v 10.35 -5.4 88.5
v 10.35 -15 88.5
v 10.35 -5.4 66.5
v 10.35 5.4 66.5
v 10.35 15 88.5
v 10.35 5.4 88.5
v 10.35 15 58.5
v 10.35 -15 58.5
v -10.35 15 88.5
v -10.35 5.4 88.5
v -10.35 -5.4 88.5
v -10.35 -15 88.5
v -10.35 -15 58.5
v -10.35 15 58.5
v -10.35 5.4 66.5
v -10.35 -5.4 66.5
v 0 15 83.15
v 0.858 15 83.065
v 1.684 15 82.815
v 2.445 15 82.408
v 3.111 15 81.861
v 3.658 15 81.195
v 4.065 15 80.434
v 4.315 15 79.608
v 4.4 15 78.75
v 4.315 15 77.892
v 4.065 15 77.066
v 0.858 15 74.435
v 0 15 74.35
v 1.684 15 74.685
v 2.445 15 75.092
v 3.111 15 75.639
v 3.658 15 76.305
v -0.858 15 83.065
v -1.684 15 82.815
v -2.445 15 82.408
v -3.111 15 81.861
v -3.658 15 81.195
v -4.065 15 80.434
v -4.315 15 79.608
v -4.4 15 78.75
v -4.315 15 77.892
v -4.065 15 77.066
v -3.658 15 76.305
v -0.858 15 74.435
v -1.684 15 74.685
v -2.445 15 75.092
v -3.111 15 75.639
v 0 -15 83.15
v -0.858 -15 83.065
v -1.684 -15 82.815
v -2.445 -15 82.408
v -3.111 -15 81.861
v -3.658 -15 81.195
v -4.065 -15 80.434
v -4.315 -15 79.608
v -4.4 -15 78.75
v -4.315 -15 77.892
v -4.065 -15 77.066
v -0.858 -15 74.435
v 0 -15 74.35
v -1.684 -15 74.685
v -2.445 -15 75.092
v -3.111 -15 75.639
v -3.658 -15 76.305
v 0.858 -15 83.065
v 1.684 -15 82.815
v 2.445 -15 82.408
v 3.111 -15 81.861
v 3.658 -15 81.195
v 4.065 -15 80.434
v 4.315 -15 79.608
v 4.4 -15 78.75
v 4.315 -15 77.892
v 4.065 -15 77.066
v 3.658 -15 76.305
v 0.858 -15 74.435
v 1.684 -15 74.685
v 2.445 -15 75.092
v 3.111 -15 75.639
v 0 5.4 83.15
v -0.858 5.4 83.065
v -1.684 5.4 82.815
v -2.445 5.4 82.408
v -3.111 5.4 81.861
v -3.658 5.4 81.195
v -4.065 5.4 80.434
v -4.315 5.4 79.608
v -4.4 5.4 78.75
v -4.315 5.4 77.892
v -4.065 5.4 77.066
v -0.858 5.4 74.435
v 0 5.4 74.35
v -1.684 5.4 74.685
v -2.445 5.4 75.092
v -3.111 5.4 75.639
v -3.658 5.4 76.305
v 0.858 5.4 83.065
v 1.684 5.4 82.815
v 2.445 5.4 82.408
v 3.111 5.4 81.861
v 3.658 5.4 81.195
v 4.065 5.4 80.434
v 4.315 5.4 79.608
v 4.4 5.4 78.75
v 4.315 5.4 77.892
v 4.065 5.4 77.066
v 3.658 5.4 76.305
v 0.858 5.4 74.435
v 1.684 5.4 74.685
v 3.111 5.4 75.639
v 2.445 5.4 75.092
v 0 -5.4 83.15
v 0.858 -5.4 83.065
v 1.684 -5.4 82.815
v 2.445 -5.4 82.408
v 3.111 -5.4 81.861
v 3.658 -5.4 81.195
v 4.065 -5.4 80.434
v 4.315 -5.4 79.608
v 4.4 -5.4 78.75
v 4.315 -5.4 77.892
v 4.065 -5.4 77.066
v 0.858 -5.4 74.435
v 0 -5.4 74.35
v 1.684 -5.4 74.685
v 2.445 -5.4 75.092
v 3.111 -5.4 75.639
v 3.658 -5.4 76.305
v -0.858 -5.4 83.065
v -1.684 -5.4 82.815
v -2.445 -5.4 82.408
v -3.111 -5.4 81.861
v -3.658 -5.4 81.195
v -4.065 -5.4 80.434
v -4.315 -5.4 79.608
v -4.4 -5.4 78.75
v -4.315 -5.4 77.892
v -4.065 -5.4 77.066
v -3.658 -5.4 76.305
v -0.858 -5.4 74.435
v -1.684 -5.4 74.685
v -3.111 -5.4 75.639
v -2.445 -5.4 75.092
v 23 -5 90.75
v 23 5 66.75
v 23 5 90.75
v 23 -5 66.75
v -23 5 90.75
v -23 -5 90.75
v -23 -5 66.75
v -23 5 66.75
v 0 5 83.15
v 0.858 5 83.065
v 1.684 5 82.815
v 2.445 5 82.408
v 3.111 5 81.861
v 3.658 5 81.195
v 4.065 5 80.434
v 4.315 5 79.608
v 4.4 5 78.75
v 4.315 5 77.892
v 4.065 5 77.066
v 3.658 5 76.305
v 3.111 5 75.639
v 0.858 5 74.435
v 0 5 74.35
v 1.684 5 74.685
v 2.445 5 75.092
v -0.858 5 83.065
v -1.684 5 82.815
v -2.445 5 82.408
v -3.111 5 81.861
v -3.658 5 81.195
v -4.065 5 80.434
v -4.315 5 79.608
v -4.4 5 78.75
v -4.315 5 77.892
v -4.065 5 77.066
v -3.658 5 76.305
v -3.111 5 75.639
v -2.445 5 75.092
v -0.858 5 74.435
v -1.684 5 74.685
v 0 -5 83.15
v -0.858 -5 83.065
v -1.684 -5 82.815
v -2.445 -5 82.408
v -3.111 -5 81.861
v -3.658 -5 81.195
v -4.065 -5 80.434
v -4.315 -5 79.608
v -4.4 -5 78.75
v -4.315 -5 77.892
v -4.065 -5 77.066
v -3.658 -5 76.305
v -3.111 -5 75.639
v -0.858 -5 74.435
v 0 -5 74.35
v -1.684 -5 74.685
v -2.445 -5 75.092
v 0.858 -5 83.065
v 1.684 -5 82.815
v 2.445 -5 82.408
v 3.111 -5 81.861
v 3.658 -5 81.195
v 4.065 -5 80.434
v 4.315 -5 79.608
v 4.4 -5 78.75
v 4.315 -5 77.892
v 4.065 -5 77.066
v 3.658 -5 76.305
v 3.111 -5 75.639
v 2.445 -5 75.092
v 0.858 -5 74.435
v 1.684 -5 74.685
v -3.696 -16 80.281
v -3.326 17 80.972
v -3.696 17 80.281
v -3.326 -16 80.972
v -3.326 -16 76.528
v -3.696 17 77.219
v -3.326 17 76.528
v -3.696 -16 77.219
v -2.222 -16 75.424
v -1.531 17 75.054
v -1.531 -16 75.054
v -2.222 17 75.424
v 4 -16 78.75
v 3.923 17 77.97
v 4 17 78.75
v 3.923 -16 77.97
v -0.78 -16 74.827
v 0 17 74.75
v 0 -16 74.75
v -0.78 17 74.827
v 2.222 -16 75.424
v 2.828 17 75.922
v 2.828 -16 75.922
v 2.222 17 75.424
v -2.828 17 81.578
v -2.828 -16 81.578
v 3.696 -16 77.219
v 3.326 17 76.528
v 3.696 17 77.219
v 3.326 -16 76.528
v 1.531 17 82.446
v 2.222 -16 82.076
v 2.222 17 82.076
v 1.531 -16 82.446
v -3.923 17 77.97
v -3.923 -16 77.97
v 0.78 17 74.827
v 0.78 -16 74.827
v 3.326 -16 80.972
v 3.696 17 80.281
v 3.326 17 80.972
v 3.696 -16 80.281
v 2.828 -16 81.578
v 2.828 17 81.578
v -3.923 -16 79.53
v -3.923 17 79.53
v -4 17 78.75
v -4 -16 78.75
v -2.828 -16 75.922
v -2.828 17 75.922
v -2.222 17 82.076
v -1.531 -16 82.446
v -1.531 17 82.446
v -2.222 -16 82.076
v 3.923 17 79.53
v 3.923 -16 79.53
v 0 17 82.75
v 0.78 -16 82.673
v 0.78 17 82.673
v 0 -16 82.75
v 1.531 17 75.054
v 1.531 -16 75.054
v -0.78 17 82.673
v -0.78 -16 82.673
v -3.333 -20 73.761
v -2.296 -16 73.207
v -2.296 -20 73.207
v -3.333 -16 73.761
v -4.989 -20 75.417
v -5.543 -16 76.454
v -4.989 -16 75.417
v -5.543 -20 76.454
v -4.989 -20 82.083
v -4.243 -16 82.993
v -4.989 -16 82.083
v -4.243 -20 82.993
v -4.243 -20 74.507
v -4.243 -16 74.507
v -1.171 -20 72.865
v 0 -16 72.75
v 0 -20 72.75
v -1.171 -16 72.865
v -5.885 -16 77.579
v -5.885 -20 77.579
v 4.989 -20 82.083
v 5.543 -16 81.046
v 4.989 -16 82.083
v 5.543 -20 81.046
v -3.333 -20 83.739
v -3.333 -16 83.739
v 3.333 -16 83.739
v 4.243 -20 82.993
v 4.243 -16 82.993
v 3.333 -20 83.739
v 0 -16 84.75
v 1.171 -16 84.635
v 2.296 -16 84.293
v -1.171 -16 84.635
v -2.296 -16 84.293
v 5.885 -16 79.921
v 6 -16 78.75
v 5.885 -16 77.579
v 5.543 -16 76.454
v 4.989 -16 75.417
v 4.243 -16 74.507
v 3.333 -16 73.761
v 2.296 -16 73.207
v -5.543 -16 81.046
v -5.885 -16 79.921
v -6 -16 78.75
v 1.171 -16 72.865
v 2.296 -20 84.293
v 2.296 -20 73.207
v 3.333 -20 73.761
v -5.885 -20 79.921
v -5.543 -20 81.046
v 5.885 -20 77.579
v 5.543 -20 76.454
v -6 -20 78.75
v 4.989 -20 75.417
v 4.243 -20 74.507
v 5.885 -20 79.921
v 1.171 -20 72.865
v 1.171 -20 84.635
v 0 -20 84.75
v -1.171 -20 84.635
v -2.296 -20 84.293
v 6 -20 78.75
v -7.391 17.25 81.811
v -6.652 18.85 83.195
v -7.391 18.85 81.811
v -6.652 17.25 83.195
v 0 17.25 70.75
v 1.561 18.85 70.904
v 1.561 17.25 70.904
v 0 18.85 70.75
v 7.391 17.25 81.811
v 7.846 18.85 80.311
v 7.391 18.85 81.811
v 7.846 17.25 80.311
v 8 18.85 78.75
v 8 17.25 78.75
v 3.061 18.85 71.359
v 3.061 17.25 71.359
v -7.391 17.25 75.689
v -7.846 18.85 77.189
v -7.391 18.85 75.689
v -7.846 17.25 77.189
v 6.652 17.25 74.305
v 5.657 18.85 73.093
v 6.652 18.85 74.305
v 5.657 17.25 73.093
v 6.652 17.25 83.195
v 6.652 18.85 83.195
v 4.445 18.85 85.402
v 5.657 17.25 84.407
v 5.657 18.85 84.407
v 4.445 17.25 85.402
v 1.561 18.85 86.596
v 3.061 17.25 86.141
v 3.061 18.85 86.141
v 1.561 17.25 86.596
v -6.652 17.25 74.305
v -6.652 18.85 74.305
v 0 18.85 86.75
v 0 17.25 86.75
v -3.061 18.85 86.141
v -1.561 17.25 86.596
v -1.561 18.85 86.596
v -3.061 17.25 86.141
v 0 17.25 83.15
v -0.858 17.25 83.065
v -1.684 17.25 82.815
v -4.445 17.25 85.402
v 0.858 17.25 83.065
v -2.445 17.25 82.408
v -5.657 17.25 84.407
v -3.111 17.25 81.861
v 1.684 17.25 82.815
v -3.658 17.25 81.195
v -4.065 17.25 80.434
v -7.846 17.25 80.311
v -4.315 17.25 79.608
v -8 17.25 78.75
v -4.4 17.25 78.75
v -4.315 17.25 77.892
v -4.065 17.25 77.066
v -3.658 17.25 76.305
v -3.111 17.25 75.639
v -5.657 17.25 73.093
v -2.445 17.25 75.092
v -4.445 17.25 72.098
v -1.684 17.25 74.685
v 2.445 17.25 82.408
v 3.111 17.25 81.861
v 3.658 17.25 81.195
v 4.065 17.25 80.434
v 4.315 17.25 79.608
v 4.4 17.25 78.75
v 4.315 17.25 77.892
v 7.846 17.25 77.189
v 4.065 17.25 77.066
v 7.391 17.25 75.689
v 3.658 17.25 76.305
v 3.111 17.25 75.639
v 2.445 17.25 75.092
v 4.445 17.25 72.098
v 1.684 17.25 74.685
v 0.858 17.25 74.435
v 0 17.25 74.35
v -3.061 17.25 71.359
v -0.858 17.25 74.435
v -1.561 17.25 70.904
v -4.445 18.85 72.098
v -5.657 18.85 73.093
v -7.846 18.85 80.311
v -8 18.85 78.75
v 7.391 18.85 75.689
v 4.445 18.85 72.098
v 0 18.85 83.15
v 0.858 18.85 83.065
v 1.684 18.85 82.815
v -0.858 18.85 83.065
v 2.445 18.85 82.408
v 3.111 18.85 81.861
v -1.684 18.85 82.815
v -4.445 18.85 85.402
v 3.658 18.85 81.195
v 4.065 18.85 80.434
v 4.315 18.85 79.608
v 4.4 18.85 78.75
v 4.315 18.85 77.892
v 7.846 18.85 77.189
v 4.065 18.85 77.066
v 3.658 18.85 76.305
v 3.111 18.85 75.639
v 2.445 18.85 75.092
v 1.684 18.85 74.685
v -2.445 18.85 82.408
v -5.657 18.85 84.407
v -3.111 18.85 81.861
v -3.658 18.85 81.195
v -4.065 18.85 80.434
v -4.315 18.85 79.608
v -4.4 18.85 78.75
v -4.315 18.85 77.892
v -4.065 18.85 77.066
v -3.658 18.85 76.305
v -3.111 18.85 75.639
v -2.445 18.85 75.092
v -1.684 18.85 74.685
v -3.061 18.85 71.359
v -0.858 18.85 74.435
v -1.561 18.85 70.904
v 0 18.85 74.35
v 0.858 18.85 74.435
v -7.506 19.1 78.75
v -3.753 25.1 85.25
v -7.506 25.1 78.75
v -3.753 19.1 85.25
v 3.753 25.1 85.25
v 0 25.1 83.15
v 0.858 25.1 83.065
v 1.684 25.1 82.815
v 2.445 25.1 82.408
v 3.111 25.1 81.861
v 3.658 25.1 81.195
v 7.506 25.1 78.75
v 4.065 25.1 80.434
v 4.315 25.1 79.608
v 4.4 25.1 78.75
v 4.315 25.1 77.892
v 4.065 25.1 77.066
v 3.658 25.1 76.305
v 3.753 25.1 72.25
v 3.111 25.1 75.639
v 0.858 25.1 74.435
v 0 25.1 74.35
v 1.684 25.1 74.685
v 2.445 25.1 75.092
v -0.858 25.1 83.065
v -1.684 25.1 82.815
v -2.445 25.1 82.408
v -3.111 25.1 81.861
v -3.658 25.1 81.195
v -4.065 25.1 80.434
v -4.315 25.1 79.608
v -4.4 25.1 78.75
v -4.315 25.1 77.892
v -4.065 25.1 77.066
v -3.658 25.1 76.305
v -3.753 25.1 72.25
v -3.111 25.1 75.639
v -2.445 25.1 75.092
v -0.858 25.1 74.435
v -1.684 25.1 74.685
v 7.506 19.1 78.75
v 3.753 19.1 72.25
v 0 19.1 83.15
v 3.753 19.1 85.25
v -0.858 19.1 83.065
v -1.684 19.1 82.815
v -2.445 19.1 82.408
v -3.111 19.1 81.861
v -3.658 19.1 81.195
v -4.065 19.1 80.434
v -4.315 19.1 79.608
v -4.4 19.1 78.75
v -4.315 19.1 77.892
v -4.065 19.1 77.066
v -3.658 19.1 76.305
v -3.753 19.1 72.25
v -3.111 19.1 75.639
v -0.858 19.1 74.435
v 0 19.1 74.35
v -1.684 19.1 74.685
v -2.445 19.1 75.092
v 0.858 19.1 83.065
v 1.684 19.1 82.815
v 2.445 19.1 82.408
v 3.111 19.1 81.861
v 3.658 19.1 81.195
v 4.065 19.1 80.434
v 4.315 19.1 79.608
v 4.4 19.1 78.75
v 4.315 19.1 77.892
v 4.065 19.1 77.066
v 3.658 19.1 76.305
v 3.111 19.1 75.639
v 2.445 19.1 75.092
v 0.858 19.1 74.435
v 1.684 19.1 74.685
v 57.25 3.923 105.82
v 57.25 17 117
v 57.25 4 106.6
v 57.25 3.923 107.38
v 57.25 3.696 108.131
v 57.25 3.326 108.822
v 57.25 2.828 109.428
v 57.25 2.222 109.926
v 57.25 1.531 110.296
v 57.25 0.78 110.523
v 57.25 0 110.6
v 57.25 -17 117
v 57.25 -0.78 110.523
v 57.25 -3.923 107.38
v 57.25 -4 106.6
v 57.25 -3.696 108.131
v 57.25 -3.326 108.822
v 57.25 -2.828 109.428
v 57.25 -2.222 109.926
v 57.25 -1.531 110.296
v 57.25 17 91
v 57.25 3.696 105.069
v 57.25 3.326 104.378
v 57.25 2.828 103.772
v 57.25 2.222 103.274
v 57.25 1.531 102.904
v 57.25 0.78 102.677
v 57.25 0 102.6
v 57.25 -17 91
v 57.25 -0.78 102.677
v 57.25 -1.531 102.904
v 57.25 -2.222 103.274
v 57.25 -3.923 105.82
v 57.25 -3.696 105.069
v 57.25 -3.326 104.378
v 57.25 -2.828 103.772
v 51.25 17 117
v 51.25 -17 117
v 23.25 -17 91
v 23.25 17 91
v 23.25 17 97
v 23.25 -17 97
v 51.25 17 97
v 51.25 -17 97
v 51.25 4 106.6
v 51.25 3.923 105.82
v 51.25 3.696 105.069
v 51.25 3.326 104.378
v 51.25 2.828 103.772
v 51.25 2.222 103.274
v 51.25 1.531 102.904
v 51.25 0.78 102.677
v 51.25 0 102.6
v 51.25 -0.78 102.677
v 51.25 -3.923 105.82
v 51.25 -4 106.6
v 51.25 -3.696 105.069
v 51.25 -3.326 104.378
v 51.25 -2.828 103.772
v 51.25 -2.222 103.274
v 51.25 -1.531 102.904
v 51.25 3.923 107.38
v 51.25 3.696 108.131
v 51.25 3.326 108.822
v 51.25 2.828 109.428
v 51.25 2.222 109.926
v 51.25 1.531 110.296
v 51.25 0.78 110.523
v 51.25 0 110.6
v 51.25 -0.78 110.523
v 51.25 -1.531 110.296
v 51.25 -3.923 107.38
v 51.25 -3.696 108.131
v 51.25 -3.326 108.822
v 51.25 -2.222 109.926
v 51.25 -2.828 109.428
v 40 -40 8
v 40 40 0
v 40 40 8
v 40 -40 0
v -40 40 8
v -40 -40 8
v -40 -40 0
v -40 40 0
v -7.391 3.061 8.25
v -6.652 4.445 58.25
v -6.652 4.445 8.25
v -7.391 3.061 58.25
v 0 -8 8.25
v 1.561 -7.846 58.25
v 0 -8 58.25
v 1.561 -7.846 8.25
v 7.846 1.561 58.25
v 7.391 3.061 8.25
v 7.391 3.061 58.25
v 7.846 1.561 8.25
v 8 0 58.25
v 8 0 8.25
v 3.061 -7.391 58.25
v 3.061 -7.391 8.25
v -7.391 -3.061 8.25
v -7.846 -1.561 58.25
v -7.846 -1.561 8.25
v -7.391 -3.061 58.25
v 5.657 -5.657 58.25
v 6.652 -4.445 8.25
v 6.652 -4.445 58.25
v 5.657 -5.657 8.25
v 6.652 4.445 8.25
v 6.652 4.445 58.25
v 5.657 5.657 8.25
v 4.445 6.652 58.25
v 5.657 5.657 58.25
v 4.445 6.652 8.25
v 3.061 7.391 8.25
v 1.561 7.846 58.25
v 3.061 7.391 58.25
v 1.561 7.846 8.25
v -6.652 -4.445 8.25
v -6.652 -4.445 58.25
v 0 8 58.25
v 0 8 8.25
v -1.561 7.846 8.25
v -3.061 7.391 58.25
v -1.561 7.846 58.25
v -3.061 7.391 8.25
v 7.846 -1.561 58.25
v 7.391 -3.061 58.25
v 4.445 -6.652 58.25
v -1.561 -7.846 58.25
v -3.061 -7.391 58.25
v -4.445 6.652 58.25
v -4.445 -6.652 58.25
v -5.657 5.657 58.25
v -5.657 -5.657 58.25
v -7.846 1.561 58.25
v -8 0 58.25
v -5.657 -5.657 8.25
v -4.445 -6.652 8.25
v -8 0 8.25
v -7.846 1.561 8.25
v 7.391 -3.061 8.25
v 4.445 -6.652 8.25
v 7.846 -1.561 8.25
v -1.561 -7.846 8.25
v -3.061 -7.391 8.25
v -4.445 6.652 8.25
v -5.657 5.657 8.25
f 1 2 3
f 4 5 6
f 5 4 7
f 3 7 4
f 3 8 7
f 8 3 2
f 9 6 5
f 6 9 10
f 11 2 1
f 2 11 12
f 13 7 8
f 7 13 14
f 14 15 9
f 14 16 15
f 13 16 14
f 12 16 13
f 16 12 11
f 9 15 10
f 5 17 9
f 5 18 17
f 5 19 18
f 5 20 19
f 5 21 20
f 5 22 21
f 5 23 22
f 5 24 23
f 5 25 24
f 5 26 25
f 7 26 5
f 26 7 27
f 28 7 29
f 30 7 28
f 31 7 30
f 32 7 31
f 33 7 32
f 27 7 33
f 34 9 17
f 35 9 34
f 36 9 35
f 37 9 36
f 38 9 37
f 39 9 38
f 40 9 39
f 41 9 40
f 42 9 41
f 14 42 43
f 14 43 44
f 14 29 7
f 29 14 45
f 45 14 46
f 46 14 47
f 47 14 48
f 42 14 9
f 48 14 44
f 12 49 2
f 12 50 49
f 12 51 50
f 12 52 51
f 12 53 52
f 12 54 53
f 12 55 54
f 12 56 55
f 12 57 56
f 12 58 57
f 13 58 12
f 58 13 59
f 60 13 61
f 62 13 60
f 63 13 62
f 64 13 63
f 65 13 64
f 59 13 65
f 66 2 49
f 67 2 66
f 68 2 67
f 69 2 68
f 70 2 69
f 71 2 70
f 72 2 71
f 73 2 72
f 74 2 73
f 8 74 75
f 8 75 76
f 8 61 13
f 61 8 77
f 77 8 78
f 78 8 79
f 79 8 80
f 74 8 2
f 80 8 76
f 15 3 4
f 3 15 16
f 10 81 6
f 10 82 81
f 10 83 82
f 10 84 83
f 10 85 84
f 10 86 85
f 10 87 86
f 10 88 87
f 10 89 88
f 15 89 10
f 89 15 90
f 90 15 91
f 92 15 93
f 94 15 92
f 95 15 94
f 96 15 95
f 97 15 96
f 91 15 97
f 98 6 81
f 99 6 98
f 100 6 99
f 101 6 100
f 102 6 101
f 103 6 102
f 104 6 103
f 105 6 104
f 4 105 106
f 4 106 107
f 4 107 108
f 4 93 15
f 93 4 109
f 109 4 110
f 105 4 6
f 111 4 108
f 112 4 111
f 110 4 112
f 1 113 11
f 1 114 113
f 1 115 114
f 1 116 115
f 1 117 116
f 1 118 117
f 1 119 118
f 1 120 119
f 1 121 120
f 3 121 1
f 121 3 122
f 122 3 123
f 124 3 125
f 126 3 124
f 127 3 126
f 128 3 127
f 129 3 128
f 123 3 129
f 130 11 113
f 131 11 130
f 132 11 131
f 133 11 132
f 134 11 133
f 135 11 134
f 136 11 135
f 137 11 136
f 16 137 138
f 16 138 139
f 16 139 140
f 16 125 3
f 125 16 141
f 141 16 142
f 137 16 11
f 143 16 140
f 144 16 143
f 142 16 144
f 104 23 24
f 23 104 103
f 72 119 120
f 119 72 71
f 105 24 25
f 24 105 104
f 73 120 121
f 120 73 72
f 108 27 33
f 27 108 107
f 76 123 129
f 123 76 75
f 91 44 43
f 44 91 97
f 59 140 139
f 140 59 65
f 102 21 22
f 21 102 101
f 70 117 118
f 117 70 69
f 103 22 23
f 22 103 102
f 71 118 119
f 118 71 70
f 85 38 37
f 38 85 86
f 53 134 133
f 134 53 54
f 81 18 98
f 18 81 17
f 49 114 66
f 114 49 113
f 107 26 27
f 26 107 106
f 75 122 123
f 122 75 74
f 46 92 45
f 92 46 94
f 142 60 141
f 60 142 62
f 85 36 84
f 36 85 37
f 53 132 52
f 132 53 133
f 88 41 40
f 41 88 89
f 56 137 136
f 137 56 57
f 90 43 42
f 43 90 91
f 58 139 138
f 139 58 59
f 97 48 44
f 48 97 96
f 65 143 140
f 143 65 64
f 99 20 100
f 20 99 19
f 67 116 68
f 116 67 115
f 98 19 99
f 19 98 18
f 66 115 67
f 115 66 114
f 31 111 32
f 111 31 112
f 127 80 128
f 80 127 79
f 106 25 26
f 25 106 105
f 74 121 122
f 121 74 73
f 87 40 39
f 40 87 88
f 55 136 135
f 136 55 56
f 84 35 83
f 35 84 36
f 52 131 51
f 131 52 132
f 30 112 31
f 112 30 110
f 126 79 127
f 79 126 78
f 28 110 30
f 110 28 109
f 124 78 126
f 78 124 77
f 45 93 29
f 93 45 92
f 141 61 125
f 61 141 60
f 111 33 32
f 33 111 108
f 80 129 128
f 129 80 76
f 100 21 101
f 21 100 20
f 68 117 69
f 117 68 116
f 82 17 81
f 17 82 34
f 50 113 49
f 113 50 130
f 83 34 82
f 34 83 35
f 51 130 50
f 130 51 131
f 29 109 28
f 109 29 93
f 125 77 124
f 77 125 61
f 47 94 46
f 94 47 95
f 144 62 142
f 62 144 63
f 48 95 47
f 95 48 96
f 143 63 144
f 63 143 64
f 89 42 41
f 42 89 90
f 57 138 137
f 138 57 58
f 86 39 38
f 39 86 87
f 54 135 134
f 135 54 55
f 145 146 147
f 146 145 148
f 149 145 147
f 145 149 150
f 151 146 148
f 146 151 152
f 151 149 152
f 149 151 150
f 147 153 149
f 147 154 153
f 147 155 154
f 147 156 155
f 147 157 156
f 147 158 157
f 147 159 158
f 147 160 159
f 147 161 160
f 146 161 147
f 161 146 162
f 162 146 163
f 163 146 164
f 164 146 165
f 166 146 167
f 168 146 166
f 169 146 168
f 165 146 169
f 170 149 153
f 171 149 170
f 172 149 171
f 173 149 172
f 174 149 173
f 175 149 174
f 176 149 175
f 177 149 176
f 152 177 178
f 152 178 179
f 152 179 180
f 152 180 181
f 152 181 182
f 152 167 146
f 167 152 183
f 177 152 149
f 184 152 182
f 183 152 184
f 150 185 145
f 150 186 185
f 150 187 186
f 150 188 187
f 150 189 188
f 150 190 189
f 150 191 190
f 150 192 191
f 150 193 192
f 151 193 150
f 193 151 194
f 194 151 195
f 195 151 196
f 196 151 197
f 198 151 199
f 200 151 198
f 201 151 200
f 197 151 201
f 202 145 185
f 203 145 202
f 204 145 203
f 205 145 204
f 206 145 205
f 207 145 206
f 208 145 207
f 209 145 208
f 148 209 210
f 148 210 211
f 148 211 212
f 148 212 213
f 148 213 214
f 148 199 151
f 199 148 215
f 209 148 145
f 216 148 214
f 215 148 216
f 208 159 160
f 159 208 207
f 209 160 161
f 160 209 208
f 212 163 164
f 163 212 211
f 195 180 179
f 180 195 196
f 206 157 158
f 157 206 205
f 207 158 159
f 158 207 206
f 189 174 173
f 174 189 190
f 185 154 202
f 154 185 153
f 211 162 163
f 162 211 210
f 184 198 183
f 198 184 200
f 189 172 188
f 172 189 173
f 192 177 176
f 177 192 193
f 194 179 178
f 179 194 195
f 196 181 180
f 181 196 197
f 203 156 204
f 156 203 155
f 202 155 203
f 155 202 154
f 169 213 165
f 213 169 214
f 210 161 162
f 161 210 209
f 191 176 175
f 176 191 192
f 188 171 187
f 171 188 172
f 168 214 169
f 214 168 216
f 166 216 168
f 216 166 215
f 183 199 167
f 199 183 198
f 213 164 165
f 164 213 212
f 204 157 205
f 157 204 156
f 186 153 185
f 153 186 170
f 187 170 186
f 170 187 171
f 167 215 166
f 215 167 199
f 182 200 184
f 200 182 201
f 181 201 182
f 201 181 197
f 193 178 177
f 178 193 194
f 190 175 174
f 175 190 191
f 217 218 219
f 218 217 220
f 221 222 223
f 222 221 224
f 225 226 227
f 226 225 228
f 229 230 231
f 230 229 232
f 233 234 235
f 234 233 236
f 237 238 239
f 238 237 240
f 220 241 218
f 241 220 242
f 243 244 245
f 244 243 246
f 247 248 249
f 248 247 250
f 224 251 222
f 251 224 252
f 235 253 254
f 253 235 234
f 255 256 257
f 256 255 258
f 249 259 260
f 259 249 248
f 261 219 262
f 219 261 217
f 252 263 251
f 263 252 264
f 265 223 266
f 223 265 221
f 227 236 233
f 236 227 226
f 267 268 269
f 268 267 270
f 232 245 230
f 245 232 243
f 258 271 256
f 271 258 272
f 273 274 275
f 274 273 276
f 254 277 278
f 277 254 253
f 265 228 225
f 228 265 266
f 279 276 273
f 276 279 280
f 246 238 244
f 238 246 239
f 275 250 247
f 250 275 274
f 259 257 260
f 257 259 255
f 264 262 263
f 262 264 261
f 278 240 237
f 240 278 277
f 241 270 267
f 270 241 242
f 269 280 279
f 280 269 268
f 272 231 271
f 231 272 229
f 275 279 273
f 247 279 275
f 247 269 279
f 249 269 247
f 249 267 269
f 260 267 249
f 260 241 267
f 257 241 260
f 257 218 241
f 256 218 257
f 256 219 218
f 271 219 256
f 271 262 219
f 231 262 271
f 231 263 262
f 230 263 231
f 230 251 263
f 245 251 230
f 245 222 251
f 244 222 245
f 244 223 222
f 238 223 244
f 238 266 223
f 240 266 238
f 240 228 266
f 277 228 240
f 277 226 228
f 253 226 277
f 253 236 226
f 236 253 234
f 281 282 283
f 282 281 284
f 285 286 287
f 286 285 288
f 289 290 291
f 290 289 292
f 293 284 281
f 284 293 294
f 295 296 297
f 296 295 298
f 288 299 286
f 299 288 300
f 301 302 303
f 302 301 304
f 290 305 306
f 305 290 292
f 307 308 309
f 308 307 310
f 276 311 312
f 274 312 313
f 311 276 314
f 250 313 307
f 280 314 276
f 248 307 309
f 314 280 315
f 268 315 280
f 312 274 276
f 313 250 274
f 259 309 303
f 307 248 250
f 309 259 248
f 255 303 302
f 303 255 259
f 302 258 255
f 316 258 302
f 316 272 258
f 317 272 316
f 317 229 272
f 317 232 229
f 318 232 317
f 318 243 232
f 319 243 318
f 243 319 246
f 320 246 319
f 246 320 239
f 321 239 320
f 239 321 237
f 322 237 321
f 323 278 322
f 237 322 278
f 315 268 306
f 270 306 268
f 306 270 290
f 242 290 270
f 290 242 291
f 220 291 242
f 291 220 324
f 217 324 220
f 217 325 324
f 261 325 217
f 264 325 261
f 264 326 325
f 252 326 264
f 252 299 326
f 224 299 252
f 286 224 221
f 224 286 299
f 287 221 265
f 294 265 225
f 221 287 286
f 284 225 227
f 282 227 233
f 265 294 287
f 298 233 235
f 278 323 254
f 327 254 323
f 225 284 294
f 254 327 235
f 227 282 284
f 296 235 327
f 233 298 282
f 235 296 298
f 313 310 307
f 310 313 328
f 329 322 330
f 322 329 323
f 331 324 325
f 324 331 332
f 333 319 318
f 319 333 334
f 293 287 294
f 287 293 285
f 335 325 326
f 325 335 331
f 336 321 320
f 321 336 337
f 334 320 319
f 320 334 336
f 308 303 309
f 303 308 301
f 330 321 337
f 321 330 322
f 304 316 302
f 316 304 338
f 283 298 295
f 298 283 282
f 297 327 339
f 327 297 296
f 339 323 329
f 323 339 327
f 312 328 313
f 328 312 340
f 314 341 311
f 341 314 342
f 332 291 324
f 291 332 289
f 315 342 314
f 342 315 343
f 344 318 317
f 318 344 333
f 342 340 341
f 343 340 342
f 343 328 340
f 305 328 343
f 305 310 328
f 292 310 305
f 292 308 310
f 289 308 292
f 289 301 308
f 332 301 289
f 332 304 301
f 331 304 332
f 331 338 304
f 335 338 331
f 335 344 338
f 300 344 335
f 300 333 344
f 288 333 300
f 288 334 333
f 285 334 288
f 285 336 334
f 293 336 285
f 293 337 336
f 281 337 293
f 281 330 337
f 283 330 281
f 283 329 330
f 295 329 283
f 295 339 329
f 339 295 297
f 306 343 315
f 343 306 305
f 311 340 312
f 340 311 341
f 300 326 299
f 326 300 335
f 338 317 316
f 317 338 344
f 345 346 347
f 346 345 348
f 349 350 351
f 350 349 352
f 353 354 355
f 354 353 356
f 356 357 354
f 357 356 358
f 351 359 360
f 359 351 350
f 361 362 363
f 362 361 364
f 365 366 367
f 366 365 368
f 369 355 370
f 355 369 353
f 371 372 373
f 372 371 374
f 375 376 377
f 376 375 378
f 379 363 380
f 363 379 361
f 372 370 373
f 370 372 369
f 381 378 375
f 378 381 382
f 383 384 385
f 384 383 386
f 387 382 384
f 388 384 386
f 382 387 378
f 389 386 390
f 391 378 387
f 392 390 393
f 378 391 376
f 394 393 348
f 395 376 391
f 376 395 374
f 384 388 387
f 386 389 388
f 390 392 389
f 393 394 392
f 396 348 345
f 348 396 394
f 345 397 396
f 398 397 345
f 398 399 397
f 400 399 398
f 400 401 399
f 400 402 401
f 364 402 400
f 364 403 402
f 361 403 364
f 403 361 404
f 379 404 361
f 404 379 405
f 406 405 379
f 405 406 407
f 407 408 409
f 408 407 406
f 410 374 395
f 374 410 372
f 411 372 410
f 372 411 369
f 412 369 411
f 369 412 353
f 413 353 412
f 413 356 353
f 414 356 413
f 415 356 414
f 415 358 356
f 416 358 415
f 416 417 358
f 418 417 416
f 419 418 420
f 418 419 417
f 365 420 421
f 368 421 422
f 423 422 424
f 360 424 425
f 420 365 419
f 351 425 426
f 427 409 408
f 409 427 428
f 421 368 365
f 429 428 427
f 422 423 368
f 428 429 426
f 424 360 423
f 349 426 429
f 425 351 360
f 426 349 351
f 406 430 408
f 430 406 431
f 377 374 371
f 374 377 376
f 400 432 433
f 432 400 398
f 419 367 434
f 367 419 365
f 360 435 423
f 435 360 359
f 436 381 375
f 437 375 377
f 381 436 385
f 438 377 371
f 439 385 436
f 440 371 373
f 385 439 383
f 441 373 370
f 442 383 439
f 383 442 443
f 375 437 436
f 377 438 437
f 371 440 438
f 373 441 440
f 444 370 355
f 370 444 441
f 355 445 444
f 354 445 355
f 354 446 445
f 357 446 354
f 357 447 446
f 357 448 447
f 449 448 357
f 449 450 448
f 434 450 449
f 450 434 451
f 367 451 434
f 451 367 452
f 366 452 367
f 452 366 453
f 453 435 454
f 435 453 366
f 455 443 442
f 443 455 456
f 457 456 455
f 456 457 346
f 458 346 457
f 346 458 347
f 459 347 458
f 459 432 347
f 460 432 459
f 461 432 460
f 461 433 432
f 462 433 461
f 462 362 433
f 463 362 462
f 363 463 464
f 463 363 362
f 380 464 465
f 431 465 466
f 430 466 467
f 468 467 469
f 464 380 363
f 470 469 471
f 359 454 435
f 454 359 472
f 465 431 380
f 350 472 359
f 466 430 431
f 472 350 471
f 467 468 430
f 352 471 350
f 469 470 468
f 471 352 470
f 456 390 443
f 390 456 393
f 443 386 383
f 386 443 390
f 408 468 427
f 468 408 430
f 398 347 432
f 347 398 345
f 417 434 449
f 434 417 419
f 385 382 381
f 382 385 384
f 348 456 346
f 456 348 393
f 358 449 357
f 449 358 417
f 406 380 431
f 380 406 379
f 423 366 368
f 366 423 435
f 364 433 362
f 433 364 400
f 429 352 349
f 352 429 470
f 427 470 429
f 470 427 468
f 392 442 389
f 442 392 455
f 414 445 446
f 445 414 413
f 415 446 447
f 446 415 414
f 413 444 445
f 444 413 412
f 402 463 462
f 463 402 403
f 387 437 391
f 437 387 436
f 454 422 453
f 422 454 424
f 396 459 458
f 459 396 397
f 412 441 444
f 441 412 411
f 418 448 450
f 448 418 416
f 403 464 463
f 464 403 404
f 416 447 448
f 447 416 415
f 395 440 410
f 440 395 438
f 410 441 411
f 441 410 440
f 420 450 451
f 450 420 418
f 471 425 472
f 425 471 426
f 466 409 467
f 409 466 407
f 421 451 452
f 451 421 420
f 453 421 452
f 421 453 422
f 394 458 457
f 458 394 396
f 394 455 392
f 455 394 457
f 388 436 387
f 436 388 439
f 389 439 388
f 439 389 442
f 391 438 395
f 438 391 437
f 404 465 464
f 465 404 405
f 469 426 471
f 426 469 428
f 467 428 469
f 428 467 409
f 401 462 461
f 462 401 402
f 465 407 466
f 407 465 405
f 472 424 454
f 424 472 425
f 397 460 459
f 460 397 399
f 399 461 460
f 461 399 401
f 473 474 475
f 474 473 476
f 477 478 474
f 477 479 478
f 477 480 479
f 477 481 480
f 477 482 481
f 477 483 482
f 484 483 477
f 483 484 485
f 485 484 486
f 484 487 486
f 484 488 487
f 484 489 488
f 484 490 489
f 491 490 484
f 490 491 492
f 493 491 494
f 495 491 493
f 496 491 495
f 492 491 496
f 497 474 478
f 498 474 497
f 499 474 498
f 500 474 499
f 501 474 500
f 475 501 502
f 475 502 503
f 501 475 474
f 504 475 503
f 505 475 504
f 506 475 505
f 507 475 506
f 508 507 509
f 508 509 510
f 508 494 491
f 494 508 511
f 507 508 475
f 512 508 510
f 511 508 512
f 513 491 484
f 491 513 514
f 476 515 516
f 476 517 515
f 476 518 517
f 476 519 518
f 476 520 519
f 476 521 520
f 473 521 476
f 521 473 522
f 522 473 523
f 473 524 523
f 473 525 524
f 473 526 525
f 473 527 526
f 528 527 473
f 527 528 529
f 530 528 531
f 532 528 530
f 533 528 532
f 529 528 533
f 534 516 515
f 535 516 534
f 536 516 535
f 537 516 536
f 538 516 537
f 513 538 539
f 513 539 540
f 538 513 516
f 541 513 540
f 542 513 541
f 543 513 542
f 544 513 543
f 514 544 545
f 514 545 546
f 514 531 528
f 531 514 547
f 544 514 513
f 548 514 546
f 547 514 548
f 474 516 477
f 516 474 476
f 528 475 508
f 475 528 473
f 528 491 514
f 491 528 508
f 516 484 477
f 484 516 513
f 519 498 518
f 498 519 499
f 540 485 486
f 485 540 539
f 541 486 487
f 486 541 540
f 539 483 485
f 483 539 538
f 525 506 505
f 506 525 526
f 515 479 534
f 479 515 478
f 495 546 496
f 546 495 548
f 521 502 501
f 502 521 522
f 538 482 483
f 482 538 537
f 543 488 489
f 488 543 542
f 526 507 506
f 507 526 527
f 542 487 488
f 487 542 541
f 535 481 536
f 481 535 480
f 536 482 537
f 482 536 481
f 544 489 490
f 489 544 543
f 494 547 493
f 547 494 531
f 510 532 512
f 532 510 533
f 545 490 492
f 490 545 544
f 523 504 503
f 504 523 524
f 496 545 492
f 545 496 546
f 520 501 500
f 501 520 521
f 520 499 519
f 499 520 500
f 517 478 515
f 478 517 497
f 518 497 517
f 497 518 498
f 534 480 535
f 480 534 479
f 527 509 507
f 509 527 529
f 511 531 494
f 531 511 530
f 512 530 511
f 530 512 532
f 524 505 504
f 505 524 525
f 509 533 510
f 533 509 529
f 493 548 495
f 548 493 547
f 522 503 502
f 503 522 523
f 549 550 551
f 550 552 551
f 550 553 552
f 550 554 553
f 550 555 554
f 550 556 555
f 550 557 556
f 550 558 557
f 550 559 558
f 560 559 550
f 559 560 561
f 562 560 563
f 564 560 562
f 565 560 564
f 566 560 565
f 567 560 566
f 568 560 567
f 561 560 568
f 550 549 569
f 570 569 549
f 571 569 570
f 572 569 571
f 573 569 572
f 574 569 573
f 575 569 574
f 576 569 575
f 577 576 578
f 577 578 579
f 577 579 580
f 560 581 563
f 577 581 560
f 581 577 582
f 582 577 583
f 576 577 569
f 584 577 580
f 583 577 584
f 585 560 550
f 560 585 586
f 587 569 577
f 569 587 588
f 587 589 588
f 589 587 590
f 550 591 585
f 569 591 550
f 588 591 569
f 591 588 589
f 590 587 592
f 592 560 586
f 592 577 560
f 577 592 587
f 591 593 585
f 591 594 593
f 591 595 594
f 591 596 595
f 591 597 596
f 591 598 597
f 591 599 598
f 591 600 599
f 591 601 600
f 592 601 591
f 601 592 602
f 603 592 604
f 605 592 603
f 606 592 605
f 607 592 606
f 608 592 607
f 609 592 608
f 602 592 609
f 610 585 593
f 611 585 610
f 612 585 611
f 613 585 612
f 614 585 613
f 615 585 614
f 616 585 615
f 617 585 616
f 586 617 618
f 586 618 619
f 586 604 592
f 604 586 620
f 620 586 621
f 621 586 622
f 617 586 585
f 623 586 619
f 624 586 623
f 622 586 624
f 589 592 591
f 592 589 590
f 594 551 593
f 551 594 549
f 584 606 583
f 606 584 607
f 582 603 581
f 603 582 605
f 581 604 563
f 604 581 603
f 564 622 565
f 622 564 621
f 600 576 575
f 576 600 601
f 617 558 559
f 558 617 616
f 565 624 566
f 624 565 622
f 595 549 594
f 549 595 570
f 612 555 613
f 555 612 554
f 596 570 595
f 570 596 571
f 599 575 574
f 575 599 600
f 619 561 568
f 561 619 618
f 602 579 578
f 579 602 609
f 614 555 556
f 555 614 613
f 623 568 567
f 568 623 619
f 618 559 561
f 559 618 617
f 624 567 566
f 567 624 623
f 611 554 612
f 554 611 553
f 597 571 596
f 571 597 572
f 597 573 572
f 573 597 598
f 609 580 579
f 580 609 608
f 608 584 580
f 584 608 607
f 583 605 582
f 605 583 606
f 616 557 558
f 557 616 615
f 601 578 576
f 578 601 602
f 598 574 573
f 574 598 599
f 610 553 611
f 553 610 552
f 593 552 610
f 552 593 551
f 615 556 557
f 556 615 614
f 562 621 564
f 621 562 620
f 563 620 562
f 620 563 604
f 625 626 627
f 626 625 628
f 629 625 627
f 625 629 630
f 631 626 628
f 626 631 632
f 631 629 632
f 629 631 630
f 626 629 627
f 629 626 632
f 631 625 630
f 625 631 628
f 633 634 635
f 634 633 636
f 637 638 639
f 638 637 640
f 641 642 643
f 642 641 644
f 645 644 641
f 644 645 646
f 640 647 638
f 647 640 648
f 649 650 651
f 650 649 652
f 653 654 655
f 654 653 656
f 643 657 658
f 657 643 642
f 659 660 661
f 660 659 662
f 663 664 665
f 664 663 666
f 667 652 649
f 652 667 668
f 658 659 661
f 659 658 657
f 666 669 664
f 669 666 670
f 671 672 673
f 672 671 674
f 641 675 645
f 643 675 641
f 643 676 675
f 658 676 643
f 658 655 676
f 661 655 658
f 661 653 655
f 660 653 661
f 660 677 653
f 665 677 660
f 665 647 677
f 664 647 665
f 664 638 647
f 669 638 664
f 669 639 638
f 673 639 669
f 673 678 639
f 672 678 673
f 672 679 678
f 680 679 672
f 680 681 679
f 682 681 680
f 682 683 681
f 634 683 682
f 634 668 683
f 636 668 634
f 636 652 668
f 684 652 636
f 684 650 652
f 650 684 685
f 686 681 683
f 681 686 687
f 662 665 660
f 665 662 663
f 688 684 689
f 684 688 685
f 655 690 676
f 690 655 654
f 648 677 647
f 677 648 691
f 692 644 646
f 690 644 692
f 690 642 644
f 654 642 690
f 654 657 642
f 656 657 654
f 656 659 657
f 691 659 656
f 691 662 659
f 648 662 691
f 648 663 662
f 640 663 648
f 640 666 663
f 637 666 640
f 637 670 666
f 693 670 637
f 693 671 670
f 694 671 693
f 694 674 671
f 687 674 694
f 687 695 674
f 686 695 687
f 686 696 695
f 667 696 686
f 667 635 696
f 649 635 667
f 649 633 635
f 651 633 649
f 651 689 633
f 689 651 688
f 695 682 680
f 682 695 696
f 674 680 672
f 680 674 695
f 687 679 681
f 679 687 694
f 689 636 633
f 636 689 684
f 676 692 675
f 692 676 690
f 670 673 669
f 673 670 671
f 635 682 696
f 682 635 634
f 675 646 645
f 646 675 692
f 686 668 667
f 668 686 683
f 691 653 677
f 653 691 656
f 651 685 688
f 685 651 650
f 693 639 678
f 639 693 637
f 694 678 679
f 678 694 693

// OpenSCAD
$fn = 32;

// ------------------------------------------------------------------------
// Lamp arm: column d16 x 50 mm, arm 46 mm
// Every part is its own module, assembly() places every instance.
// ------------------------------------------------------------------------

// --- part 1 ---
module lamp_base() {
  difference() {
    translate([-40, -40, 0]) cube([80, 80, 8]);
  }
}

// --- part 2 ---
module lamp_column() {
  cylinder(h = 50, d = 16);
}

// --- part 3 ---
module head_fork() {
  difference() {
    translate([-10.35, -15, 0]) cube([20.7, 30, 30]);
    translate([-11.35, -5.4, 8]) cube([22.7, 10.8, 23]);
    translate([0, 0, 20.25]) rotate([90, 0, 0]) cylinder(h = 32, d = 8.8, center = true);
  }
}

// --- part 4 ---
module lamp_arm() {
  difference() {
    translate([-23, -5, 0]) cube([46, 10, 24]);
    translate([0, 0, 12]) rotate([90, 0, 0]) cylinder(h = 12, d = 8.8, center = true);
  }
}

// --- part 5 ---
module arm_pin() {
  rotate([0, 90, 0]) cylinder(h = 34, d = 8, center = true);
  translate([-20, 0, 0]) rotate([0, 90, 0]) cylinder(h = 4, d = 12);
}

// --- part 6 ---
module arm_washer() {
  difference() {
      translate([0, 0, 0]) cylinder(h = 1.6, d = 16);
      translate([0, 0, -1]) cylinder(h = 3.6, d = 8.8);
    }
}

// --- part 7 ---
module arm_nut() {
  difference() {
    linear_extrude(height = 6) polygon(points = [[7.506, 0], [3.753, 6.5], [-3.753, 6.5], [-7.506, 0], [-3.753, -6.5], [3.753, -6.5]]);
    translate([0, 0, -1]) cylinder(h = 8, d = 8.8);
  }
}

// --- part 8 ---
module shade_bracket() {
  difference() {
    translate([-17, -17, 0]) cube([34, 34, 26]);
    translate([-18, -18, 6]) cube([29, 36, 21]);
    translate([14, 0, 15.6]) rotate([0, 90, 0]) cylinder(h = 8, d = 8, center = true);
  }
}

// --- assembly ---
module assembly() {
  color([0.80, 0.24, 0.20]) translate([0, 0, 0]) rotate([0, 0, 0]) lamp_base();
  color([0.20, 0.45, 0.75]) translate([0, 0, 8.25]) rotate([0, 0, 0]) lamp_column();
  color([0.25, 0.62, 0.32]) translate([0, 0, 58.5]) rotate([0, 0, 0]) head_fork();
  color([0.92, 0.70, 0.18]) translate([0, 0, 66.75]) rotate([0, 0, 0]) lamp_arm();
  color([0.58, 0.35, 0.70]) translate([0, 0, 78.75]) rotate([0, 0, 90]) arm_pin();
  color([0.16, 0.66, 0.66]) translate([0, 18.85, 78.75]) rotate([90, 0, 0]) arm_washer();
  color([0.85, 0.48, 0.18]) translate([0, 25.1, 78.75]) rotate([90, 0, 0]) arm_nut();
  color([0.55, 0.60, 0.65]) translate([40.25, 0, 91]) rotate([0, 0, 0]) shade_bracket();
}

assembly();
